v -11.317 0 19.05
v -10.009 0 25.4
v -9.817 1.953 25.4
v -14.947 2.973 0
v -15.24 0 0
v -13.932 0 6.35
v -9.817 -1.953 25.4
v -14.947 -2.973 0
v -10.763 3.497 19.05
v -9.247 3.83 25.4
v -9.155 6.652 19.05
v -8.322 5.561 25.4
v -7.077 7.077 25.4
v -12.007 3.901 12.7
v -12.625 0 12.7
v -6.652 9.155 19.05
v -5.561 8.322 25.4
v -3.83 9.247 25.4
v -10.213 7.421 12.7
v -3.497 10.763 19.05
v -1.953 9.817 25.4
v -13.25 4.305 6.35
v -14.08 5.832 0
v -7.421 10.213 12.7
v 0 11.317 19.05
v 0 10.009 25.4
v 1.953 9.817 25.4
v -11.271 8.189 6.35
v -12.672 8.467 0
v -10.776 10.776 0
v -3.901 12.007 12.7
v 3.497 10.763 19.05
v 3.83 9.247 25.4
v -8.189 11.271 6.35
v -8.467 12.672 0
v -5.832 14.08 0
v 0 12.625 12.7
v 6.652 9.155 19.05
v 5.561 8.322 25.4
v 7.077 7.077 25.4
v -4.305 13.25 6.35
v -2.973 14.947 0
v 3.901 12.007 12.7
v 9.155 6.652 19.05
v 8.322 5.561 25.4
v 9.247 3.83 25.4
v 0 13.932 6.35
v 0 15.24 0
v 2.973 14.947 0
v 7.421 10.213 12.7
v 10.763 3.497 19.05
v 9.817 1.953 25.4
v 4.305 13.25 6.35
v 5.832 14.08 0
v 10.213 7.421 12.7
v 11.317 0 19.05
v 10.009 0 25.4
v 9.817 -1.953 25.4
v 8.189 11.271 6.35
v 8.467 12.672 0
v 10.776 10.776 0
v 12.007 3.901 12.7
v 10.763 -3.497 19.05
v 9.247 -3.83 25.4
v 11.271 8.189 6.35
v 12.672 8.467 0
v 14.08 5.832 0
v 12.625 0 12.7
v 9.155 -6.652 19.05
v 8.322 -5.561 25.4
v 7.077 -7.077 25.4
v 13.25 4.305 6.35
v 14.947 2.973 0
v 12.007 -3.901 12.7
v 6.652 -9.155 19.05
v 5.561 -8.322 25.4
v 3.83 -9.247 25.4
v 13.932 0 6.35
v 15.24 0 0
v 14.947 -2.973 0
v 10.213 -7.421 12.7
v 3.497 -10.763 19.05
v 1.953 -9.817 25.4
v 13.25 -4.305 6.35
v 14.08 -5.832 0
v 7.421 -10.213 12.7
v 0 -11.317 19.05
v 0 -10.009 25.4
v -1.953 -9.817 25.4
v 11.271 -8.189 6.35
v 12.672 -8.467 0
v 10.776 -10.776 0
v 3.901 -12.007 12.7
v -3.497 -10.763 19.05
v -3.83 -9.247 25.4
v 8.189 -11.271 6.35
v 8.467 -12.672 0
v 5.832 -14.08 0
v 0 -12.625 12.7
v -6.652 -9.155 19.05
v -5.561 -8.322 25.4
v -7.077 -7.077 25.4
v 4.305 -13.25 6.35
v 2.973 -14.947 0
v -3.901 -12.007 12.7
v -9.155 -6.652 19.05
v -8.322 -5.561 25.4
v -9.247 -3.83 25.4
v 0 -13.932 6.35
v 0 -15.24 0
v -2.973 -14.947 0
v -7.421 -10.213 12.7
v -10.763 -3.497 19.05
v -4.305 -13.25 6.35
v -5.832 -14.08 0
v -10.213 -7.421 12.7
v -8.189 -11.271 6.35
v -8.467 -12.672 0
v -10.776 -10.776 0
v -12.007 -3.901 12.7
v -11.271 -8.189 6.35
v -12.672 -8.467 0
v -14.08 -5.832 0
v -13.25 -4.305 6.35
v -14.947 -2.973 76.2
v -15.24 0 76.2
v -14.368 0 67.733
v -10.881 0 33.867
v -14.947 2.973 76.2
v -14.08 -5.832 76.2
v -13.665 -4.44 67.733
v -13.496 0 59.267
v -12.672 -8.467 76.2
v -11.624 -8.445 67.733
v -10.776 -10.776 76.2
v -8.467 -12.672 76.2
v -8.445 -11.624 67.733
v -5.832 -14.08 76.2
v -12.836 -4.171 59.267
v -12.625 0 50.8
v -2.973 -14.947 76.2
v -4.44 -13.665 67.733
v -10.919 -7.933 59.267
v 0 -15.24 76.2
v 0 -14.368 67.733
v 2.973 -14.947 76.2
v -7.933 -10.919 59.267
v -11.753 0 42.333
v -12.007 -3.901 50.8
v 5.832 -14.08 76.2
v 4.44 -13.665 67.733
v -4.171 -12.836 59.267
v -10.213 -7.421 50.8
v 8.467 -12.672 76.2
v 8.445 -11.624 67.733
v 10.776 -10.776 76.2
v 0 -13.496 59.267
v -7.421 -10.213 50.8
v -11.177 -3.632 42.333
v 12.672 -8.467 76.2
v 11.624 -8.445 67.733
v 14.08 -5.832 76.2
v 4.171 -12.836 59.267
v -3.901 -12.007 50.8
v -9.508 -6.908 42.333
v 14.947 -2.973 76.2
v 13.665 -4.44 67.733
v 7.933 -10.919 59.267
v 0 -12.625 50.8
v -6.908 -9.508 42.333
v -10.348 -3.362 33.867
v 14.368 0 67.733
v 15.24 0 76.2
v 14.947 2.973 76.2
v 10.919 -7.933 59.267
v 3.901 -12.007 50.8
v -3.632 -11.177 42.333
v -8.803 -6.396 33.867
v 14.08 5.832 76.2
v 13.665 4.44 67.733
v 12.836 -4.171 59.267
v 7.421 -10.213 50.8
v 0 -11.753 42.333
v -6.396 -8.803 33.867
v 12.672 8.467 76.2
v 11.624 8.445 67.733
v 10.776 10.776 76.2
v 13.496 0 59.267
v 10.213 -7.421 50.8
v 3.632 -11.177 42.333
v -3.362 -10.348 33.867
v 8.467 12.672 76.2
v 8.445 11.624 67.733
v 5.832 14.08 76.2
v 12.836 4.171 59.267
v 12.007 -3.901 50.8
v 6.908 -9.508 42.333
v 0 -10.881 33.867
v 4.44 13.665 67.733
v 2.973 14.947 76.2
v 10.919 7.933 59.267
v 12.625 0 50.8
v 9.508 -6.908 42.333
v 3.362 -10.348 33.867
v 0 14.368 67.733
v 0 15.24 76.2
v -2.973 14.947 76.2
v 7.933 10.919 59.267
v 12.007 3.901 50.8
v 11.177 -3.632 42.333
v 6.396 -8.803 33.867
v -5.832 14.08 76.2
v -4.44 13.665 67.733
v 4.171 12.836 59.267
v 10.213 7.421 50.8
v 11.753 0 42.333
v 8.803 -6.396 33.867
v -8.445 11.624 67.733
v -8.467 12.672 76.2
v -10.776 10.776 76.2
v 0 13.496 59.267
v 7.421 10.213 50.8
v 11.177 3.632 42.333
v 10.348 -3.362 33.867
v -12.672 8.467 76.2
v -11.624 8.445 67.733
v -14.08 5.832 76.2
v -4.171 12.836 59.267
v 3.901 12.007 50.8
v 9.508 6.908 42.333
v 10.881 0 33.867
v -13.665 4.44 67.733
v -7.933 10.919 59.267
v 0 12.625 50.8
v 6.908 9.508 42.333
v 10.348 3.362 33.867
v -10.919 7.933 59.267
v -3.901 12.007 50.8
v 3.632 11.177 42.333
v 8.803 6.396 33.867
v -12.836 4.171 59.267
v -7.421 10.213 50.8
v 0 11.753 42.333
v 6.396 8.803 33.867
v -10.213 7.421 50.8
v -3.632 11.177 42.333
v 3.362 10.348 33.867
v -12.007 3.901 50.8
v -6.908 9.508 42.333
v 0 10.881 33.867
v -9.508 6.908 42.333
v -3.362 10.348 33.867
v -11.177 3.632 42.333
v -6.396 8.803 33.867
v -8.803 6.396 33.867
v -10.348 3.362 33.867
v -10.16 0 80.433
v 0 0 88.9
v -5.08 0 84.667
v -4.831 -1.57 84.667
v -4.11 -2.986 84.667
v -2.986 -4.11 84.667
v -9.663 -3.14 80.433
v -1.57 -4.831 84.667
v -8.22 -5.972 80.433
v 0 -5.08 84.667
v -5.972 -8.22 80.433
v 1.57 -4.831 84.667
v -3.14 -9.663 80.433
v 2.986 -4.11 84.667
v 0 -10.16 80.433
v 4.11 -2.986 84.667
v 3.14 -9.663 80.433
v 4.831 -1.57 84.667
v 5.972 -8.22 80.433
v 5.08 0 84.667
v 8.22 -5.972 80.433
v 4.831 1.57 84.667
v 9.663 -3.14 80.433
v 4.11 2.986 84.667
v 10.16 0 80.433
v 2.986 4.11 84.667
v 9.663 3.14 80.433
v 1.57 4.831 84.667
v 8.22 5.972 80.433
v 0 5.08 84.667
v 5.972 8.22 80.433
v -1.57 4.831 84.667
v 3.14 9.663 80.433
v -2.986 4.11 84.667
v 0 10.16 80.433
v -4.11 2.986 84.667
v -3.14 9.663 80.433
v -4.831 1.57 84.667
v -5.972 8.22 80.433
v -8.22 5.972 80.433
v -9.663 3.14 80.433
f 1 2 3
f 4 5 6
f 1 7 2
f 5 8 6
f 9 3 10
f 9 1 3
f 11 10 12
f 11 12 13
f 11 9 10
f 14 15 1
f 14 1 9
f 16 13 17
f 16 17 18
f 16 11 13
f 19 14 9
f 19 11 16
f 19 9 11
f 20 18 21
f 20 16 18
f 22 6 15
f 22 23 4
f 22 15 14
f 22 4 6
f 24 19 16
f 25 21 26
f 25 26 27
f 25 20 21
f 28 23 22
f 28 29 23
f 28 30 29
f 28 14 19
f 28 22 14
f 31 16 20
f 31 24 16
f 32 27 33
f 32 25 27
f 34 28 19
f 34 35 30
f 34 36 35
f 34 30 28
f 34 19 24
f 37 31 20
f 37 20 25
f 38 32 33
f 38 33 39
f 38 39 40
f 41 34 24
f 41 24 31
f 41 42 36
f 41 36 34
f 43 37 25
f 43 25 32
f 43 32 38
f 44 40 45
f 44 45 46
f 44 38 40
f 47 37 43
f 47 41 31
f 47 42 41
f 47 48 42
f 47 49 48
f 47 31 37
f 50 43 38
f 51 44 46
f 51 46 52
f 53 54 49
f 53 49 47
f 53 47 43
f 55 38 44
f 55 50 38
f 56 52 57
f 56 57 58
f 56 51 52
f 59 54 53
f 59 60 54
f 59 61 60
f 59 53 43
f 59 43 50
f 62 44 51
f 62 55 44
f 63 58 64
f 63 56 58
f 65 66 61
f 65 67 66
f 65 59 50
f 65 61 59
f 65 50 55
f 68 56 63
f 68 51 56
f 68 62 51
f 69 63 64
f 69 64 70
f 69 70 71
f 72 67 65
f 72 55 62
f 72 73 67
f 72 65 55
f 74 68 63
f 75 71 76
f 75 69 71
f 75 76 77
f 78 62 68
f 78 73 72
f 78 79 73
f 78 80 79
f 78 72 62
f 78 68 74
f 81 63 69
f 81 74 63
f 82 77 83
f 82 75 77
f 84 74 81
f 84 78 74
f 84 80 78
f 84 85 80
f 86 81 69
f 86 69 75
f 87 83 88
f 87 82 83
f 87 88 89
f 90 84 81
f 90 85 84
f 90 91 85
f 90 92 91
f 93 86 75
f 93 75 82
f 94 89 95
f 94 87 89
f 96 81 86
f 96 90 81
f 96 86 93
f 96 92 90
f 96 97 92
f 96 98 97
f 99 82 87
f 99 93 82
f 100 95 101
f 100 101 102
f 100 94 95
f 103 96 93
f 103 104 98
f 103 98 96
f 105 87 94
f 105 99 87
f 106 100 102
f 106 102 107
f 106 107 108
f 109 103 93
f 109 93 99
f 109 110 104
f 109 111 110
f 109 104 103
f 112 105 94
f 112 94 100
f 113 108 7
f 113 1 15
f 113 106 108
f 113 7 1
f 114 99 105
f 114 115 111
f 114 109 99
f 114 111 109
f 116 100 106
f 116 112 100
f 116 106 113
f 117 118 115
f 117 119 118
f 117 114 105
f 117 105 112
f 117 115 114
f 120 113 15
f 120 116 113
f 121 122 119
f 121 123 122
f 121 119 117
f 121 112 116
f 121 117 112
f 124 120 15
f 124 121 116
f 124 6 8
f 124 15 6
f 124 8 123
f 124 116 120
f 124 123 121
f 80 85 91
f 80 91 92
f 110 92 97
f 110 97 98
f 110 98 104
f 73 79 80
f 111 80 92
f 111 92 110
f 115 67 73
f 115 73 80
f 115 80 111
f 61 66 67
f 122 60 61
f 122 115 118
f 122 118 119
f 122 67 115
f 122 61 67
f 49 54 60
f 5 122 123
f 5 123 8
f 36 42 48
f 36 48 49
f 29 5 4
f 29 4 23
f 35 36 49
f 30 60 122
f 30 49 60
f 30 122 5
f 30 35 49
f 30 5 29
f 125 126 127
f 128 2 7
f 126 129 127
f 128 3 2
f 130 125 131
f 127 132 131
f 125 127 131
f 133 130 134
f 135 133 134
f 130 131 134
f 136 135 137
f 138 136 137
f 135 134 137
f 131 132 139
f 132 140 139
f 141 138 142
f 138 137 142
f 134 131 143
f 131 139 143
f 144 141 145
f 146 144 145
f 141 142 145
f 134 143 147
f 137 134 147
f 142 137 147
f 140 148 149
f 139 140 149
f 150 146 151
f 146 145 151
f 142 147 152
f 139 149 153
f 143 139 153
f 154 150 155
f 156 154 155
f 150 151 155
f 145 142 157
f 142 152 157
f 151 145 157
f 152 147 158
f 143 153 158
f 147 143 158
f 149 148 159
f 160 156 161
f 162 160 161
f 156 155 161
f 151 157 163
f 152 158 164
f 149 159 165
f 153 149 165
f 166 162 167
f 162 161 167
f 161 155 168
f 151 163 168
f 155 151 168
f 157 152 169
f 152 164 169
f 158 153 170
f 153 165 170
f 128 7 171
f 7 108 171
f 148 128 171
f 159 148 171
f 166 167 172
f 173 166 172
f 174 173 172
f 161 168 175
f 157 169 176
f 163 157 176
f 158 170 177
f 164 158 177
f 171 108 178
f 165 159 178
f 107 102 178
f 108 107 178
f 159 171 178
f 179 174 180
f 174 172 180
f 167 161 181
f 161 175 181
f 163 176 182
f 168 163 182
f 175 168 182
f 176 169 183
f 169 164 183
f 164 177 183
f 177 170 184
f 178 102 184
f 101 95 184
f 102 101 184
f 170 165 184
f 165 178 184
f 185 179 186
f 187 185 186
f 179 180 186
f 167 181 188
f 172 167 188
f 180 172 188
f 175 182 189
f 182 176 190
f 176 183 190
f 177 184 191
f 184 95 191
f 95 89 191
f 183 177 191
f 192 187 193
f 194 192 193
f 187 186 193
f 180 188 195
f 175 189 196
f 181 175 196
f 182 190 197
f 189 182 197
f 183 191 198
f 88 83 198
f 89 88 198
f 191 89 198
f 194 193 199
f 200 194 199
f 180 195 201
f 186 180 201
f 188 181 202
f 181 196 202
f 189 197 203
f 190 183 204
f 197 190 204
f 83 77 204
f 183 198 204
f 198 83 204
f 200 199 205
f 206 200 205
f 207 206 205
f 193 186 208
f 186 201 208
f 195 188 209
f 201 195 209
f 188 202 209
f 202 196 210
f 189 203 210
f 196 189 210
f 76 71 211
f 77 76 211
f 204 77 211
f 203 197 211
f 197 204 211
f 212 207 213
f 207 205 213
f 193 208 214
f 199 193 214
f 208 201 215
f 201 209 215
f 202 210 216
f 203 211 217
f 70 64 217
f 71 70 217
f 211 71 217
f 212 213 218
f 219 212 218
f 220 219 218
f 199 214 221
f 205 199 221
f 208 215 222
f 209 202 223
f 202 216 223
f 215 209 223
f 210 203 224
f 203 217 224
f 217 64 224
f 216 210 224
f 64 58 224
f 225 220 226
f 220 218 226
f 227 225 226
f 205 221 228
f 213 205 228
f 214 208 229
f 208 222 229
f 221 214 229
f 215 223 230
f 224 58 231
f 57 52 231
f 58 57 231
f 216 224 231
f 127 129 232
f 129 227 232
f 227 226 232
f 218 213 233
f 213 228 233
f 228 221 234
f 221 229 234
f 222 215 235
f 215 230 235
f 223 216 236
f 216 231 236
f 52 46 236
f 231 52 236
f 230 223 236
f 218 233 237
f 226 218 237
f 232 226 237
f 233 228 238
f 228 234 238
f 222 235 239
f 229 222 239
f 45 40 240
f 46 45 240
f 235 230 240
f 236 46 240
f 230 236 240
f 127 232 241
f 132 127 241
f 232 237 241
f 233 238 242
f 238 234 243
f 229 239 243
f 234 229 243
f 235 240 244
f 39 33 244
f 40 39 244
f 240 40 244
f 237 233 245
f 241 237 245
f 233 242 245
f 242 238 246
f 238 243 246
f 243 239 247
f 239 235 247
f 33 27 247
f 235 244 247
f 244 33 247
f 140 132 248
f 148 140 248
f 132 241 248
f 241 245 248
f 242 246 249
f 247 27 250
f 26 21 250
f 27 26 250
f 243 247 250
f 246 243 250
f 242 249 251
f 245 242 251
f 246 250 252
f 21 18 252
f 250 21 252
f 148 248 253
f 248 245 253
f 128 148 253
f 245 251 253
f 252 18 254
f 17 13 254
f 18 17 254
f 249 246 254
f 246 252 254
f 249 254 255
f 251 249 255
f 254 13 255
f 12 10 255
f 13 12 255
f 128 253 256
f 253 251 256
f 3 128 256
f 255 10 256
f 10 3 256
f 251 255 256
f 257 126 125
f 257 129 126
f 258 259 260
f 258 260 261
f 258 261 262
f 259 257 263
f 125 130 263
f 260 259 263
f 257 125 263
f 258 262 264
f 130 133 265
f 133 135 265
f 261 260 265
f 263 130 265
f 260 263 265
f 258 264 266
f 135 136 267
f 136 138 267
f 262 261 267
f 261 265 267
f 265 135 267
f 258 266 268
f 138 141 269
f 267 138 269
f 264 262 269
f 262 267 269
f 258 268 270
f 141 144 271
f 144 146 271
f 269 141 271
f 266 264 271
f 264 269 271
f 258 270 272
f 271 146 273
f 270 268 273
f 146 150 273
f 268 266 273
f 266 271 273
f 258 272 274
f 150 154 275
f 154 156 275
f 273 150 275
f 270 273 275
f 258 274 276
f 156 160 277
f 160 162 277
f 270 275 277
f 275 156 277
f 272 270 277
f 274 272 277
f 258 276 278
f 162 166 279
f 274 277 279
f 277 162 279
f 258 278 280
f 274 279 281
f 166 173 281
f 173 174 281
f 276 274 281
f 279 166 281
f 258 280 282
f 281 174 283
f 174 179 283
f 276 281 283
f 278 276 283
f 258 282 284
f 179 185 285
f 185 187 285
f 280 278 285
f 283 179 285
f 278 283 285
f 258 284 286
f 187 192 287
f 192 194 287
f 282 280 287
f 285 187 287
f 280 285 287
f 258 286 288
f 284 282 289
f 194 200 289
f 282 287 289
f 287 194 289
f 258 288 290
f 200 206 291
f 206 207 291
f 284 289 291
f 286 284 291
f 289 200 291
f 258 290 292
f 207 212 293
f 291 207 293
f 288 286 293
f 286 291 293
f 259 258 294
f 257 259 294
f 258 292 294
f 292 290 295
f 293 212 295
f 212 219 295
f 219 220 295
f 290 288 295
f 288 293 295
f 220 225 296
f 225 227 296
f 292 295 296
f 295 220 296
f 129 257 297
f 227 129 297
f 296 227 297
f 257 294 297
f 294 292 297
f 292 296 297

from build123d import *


with BuildPart() as f1:
    # F0 (on Front) → F1 (revolve)
    with BuildSketch(Plane.XZ):
        Polygon((-15.24, 0), (0, 0), (0, 25.4), (-10.009022, 25.4), align=None)
    revolve(axis=Axis((0, 0, 12.7), (0, 0, -1)))

    # F2 (on Front) → F3 (revolve)
    with BuildSketch(Plane.XZ):
        Polygon((-15.24, 76.2), (-10.009022, 25.4), (0, 25.4), (0, 76.2), align=None)
    revolve(axis=Axis((0, 0, 50.8), (0, 0, 1)))

    # F4 (on Front) → F5 (revolve)
    with BuildSketch(Plane.XZ):
        Polygon((-15.24, 76.2), (0, 76.2), (0, 88.9), align=None)
    revolve(axis=Axis((0, 0, 82.55), (0, 0, 1)))


solid = f1.part
